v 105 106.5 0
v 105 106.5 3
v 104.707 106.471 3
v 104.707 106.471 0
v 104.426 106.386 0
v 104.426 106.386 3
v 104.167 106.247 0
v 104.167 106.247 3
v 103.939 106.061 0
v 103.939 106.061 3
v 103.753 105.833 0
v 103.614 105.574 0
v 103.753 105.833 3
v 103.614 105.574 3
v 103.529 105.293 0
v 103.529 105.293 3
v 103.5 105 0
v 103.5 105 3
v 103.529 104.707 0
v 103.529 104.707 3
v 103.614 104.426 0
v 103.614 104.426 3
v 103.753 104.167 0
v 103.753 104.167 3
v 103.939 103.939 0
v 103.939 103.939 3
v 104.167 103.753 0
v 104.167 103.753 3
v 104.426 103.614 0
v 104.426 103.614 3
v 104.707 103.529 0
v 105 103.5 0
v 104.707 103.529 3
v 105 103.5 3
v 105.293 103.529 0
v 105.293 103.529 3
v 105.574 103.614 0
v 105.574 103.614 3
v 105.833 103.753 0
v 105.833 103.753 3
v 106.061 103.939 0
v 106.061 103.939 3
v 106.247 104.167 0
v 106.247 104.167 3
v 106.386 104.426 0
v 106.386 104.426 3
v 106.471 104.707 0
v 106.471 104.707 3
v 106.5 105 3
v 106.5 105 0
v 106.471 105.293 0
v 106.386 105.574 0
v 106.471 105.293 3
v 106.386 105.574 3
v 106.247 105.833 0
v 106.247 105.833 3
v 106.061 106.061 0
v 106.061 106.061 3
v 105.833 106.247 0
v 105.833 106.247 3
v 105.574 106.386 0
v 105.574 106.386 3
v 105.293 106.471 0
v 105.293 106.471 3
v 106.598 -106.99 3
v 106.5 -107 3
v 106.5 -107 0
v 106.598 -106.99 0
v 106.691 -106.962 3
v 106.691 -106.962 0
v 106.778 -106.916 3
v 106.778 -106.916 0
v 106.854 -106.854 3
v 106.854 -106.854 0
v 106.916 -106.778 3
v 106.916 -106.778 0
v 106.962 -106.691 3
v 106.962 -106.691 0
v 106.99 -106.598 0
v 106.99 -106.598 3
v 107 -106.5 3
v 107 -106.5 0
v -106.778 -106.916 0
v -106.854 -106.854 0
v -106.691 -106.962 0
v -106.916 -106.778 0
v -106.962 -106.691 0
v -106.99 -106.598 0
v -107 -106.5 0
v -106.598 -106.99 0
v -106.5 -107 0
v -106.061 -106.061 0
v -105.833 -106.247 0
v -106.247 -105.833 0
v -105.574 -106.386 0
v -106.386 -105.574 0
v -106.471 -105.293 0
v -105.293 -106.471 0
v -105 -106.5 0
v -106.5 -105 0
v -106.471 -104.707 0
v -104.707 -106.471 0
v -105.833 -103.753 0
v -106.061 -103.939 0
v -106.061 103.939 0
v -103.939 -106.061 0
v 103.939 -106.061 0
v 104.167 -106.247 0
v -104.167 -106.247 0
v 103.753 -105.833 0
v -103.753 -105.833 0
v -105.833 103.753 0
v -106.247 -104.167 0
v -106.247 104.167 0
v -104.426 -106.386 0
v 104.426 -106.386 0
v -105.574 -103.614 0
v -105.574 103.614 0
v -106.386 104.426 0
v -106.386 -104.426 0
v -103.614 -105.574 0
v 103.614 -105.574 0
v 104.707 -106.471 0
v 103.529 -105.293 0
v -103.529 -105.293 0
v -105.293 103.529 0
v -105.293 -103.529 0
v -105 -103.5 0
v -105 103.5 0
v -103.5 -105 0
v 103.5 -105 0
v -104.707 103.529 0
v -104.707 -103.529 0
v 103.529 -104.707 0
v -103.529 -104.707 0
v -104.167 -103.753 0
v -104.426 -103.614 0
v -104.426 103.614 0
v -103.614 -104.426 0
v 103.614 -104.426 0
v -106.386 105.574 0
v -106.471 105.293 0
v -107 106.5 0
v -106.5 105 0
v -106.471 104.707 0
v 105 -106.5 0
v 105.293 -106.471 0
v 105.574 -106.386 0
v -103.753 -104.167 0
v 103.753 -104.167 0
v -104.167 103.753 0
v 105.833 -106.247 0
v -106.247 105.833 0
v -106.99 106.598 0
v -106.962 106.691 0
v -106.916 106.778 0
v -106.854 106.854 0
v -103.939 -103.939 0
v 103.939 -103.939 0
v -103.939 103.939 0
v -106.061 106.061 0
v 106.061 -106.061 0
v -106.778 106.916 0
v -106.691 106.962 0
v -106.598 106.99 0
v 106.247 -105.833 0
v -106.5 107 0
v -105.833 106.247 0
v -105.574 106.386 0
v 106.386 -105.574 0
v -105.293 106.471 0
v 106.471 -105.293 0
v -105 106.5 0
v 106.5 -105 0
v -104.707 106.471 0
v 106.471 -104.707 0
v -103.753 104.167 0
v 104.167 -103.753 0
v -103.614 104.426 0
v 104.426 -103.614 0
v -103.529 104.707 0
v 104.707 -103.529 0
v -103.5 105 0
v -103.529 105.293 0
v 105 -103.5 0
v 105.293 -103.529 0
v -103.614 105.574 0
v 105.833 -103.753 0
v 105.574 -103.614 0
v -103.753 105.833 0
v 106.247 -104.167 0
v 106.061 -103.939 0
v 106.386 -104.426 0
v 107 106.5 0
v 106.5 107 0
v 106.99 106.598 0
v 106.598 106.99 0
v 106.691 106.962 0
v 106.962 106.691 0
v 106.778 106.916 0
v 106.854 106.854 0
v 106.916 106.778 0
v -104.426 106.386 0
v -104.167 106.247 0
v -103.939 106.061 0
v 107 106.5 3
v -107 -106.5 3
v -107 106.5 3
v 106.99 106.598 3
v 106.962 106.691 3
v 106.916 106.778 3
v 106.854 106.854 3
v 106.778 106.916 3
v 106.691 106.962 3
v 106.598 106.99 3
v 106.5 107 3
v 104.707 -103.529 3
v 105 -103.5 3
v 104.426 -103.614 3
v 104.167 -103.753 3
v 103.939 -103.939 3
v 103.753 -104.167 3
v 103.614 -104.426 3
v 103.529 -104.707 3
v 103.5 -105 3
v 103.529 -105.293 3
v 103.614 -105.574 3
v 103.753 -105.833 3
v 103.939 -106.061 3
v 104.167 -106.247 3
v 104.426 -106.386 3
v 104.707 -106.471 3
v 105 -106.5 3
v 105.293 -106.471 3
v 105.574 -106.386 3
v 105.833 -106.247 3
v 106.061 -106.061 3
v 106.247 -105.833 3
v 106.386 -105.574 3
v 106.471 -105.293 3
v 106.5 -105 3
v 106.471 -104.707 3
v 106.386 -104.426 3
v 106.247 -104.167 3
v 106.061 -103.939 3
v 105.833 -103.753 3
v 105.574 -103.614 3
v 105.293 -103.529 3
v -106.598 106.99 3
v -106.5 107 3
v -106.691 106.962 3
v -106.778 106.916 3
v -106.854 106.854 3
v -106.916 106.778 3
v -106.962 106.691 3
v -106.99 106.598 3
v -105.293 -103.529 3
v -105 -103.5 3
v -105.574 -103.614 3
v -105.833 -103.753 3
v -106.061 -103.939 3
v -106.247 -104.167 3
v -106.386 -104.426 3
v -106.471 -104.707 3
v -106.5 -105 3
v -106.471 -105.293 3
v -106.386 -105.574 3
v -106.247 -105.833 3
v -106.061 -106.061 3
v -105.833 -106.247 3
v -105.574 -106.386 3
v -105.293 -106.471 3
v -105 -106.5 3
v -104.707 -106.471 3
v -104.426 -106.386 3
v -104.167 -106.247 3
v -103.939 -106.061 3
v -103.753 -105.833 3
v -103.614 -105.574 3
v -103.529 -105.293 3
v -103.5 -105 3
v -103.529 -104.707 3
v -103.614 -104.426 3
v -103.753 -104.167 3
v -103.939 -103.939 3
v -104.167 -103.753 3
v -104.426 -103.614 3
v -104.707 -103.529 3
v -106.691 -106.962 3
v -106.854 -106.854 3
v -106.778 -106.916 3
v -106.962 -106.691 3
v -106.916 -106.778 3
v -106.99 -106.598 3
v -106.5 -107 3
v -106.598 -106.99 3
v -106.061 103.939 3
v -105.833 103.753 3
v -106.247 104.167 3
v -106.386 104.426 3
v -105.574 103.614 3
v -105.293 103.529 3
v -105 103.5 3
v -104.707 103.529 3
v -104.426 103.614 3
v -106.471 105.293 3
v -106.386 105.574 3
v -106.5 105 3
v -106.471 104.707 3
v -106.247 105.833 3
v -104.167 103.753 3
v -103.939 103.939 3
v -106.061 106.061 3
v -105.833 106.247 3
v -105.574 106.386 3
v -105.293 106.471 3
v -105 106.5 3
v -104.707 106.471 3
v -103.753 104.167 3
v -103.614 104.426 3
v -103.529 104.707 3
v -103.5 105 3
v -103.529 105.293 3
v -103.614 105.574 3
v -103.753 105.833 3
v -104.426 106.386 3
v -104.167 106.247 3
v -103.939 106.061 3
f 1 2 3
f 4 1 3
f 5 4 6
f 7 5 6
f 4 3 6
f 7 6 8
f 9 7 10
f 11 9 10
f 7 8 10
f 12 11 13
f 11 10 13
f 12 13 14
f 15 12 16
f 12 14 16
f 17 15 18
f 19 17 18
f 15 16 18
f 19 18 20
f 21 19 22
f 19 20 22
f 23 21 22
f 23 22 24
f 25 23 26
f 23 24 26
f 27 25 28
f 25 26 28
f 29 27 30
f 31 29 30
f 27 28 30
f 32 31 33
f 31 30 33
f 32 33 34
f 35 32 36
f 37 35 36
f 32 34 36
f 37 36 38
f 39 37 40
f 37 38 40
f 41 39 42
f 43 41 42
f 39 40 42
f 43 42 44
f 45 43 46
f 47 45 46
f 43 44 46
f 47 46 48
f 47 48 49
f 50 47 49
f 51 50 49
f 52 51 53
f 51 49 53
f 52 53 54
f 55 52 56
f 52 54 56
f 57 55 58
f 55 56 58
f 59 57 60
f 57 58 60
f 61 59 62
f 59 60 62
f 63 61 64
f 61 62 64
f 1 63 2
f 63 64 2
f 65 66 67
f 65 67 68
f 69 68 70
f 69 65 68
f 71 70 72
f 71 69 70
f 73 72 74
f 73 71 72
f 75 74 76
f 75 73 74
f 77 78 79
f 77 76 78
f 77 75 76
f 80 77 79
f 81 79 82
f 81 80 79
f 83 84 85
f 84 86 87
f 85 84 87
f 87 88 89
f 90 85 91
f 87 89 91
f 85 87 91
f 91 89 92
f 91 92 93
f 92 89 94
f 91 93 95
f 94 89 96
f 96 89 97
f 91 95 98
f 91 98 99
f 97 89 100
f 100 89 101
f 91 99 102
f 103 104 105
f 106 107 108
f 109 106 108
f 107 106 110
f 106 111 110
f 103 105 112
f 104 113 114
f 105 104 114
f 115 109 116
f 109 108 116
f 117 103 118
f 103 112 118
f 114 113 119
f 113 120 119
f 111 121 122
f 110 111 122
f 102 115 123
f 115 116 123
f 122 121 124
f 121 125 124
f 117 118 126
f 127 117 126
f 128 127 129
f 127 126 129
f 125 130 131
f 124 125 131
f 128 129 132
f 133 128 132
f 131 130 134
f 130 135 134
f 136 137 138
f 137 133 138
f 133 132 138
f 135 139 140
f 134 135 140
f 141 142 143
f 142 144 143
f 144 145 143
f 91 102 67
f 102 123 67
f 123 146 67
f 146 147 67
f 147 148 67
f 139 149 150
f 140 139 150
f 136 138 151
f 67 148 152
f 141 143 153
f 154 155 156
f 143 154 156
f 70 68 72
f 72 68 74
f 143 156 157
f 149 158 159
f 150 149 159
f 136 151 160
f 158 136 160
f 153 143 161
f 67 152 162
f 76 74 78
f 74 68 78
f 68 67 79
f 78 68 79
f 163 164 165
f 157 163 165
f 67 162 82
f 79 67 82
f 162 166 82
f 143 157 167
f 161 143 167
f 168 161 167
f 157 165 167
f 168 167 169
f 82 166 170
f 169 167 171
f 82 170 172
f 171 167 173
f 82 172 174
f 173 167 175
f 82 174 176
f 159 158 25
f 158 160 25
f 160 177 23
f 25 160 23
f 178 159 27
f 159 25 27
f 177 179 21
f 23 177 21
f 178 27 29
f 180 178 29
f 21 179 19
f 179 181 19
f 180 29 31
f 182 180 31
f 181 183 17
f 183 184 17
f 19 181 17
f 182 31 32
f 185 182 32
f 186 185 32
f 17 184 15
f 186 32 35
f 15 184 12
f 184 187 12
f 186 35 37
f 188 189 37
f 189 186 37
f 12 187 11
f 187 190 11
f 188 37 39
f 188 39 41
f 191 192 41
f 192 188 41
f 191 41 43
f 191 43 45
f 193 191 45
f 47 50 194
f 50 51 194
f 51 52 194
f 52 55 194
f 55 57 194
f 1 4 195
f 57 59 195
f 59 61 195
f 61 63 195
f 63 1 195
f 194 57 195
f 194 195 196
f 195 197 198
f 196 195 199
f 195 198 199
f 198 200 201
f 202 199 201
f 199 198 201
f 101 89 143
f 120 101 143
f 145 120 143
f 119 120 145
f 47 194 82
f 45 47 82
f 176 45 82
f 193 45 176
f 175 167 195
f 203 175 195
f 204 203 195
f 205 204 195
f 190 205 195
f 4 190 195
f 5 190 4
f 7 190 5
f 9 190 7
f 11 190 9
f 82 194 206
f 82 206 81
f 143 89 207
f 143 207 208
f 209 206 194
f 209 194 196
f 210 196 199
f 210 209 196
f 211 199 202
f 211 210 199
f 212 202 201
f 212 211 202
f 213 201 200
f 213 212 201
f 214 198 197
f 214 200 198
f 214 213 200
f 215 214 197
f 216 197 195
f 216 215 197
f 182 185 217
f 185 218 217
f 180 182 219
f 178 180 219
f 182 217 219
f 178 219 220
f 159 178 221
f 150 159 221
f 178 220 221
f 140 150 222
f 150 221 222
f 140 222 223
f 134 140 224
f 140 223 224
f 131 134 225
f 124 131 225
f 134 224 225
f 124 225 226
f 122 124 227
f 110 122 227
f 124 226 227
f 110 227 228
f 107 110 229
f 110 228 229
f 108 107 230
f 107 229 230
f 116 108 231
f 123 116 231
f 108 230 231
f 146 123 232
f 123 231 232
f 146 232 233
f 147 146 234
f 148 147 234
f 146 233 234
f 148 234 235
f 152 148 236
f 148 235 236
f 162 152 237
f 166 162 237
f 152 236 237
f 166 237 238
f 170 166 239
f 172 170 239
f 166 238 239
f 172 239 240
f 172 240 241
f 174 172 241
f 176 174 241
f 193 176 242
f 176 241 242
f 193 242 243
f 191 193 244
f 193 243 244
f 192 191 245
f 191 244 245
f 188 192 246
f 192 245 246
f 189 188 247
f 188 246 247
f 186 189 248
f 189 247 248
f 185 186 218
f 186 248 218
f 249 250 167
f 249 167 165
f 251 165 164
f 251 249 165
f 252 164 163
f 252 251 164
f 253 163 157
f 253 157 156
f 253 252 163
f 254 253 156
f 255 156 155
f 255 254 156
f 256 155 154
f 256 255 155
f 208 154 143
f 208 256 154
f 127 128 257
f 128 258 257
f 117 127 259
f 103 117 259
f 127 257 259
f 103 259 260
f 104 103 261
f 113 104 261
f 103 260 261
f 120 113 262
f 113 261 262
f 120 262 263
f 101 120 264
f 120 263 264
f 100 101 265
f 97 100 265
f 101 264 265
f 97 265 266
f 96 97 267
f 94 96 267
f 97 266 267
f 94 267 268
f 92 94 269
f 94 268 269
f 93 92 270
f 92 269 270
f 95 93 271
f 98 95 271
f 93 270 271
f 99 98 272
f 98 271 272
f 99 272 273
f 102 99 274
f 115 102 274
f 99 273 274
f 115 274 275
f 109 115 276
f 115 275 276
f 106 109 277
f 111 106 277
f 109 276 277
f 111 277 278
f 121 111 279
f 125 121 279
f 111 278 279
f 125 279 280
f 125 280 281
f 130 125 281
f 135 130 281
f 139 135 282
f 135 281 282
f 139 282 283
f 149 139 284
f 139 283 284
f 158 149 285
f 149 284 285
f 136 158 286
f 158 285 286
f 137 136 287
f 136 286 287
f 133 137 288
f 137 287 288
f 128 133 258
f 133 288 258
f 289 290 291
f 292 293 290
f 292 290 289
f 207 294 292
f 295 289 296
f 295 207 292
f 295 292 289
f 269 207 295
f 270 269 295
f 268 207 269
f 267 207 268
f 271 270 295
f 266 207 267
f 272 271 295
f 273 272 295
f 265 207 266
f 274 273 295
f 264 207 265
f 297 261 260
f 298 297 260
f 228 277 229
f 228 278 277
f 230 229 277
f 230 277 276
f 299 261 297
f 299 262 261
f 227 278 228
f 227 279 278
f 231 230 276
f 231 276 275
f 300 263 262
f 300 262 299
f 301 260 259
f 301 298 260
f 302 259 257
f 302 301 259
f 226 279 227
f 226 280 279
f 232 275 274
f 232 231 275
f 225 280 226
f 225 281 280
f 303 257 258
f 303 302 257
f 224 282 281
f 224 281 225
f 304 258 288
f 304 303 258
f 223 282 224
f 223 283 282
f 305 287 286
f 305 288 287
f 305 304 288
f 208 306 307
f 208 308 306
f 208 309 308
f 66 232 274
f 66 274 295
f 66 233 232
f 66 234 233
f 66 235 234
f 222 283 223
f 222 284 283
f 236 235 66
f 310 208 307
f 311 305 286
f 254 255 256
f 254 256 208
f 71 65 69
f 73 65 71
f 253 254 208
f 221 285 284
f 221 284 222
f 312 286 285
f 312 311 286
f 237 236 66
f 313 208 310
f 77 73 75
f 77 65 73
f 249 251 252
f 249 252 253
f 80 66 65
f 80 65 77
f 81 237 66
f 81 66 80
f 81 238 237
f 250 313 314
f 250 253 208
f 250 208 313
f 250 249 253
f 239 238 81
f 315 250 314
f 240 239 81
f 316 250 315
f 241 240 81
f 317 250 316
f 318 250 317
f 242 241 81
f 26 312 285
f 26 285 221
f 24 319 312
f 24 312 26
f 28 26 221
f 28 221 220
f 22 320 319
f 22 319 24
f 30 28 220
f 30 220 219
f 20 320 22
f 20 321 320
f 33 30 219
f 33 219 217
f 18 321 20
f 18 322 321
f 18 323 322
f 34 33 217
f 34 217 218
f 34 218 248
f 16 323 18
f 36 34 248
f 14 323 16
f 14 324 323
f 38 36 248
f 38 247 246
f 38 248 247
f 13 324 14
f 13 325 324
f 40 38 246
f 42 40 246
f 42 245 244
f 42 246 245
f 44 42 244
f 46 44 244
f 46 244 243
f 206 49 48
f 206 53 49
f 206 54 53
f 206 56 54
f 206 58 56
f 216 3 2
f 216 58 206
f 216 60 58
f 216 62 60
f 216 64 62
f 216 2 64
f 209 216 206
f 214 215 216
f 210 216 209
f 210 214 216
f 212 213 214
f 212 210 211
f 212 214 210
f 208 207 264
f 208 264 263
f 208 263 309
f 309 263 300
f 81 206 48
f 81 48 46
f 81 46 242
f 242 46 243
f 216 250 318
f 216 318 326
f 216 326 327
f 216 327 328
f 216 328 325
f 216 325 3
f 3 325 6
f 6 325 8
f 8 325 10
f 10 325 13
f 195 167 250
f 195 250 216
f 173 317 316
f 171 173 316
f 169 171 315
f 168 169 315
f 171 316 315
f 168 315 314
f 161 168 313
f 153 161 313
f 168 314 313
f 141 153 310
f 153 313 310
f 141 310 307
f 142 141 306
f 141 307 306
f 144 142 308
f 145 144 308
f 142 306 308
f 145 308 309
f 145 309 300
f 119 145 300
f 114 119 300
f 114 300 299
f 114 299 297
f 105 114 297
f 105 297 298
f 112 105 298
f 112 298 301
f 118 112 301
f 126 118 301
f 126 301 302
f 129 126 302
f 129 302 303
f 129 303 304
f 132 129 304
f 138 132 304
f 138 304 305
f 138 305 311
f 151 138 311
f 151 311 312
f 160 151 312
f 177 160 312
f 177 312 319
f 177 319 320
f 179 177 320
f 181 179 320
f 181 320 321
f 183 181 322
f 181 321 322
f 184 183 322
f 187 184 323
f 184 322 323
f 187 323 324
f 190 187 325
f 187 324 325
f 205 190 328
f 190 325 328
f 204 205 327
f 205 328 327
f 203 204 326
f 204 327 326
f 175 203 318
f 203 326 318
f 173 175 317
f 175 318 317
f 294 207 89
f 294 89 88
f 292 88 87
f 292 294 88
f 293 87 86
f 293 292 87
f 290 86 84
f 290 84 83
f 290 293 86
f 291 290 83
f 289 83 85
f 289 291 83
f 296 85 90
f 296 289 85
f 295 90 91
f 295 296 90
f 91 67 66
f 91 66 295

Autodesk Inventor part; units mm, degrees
ref_plane "YZ Plane" through (0, 0, 0) normal (1, 0, 0) x (0, 1, 0)
sketch "Sketch1" plane through (0, 0, 0) normal (0, 0, 1) x (1, 0, 0)
  line L0 (0, 0) -> (338.7718, 0) construction
  line L1 (0, 0) -> (0, 234.489) construction
  line L2 (-107, 107) -> (107, 107)
  line L3 (107, 107) -> (107, -107)
  line L4 (107, -107) -> (-107, -107)
  line L5 (-107, -107) -> (-107, 107)
  point P0 (107, 0)
  point P1 (0, 107)
  dimension "d0" = 214
  dimension "d1" = 214
extrude "Extrusion1" add sketch "Sketch1" along normal blind 3
sketch "Sketch2" plane through (0, 0, 0) normal (0, 0, -1) x (-1, 0, 0)
  line L0 (0, 0) -> (359.3191, 0) construction
  line L1 (0, 0) -> (0, 231.2713) construction
  line L2 (-105, 105) -> (105, 105) construction
  line L3 (105, 105) -> (105, -105) construction
  line L4 (105, -105) -> (-105, -105) construction
  line L5 (-105, -105) -> (-105, 105) construction
  point P0 (0, 105)
  point P1 (105, 0)
  dimension "d4" = 210
  dimension "d5" = 210
hole "Hole1" at (105, 105, 0) at (-105, 105, 0) at (-105, -105, 0) at (105, -105, 0) direction (0, 0, 1) diameter 3 end through all
fillet "Fillet1" radius 0.5 4 edges at (107, 107, 1.5) (-107, 107, 1.5) (-107, -107, 1.5) (107, -107, 1.5)
ref_plane "Work Plane1" through (0, -106.5, 0) normal (-1, 0, 0) x (0, 0, 1)
ref_plane "Work Plane2" through (-106.5, 0, 0) normal (0, -1, 0) x (1, 0, 0)
equation "\"d0\" = platform_width"
equation "\"d1\" = platform_depth"
equation "\"d4\" = hole_spacing_width"
equation "\"d5\" = hole_spacing_depth"
equation "\"platform_width\" = 214"
equation "\"platform_depth\" = 214"
equation "\"hole_spacing_width\" = 210"
equation "\"hole_spacing_depth\" = 210"
equation "\"d14\" = -0.5 * platform_width"
equation "\"d15\" = -0.5 * platform_depth"
equation "\"bed_cl_y_offset\" = 173.25"
properties part number "Heated Bed" material "Aluminum 6061"
